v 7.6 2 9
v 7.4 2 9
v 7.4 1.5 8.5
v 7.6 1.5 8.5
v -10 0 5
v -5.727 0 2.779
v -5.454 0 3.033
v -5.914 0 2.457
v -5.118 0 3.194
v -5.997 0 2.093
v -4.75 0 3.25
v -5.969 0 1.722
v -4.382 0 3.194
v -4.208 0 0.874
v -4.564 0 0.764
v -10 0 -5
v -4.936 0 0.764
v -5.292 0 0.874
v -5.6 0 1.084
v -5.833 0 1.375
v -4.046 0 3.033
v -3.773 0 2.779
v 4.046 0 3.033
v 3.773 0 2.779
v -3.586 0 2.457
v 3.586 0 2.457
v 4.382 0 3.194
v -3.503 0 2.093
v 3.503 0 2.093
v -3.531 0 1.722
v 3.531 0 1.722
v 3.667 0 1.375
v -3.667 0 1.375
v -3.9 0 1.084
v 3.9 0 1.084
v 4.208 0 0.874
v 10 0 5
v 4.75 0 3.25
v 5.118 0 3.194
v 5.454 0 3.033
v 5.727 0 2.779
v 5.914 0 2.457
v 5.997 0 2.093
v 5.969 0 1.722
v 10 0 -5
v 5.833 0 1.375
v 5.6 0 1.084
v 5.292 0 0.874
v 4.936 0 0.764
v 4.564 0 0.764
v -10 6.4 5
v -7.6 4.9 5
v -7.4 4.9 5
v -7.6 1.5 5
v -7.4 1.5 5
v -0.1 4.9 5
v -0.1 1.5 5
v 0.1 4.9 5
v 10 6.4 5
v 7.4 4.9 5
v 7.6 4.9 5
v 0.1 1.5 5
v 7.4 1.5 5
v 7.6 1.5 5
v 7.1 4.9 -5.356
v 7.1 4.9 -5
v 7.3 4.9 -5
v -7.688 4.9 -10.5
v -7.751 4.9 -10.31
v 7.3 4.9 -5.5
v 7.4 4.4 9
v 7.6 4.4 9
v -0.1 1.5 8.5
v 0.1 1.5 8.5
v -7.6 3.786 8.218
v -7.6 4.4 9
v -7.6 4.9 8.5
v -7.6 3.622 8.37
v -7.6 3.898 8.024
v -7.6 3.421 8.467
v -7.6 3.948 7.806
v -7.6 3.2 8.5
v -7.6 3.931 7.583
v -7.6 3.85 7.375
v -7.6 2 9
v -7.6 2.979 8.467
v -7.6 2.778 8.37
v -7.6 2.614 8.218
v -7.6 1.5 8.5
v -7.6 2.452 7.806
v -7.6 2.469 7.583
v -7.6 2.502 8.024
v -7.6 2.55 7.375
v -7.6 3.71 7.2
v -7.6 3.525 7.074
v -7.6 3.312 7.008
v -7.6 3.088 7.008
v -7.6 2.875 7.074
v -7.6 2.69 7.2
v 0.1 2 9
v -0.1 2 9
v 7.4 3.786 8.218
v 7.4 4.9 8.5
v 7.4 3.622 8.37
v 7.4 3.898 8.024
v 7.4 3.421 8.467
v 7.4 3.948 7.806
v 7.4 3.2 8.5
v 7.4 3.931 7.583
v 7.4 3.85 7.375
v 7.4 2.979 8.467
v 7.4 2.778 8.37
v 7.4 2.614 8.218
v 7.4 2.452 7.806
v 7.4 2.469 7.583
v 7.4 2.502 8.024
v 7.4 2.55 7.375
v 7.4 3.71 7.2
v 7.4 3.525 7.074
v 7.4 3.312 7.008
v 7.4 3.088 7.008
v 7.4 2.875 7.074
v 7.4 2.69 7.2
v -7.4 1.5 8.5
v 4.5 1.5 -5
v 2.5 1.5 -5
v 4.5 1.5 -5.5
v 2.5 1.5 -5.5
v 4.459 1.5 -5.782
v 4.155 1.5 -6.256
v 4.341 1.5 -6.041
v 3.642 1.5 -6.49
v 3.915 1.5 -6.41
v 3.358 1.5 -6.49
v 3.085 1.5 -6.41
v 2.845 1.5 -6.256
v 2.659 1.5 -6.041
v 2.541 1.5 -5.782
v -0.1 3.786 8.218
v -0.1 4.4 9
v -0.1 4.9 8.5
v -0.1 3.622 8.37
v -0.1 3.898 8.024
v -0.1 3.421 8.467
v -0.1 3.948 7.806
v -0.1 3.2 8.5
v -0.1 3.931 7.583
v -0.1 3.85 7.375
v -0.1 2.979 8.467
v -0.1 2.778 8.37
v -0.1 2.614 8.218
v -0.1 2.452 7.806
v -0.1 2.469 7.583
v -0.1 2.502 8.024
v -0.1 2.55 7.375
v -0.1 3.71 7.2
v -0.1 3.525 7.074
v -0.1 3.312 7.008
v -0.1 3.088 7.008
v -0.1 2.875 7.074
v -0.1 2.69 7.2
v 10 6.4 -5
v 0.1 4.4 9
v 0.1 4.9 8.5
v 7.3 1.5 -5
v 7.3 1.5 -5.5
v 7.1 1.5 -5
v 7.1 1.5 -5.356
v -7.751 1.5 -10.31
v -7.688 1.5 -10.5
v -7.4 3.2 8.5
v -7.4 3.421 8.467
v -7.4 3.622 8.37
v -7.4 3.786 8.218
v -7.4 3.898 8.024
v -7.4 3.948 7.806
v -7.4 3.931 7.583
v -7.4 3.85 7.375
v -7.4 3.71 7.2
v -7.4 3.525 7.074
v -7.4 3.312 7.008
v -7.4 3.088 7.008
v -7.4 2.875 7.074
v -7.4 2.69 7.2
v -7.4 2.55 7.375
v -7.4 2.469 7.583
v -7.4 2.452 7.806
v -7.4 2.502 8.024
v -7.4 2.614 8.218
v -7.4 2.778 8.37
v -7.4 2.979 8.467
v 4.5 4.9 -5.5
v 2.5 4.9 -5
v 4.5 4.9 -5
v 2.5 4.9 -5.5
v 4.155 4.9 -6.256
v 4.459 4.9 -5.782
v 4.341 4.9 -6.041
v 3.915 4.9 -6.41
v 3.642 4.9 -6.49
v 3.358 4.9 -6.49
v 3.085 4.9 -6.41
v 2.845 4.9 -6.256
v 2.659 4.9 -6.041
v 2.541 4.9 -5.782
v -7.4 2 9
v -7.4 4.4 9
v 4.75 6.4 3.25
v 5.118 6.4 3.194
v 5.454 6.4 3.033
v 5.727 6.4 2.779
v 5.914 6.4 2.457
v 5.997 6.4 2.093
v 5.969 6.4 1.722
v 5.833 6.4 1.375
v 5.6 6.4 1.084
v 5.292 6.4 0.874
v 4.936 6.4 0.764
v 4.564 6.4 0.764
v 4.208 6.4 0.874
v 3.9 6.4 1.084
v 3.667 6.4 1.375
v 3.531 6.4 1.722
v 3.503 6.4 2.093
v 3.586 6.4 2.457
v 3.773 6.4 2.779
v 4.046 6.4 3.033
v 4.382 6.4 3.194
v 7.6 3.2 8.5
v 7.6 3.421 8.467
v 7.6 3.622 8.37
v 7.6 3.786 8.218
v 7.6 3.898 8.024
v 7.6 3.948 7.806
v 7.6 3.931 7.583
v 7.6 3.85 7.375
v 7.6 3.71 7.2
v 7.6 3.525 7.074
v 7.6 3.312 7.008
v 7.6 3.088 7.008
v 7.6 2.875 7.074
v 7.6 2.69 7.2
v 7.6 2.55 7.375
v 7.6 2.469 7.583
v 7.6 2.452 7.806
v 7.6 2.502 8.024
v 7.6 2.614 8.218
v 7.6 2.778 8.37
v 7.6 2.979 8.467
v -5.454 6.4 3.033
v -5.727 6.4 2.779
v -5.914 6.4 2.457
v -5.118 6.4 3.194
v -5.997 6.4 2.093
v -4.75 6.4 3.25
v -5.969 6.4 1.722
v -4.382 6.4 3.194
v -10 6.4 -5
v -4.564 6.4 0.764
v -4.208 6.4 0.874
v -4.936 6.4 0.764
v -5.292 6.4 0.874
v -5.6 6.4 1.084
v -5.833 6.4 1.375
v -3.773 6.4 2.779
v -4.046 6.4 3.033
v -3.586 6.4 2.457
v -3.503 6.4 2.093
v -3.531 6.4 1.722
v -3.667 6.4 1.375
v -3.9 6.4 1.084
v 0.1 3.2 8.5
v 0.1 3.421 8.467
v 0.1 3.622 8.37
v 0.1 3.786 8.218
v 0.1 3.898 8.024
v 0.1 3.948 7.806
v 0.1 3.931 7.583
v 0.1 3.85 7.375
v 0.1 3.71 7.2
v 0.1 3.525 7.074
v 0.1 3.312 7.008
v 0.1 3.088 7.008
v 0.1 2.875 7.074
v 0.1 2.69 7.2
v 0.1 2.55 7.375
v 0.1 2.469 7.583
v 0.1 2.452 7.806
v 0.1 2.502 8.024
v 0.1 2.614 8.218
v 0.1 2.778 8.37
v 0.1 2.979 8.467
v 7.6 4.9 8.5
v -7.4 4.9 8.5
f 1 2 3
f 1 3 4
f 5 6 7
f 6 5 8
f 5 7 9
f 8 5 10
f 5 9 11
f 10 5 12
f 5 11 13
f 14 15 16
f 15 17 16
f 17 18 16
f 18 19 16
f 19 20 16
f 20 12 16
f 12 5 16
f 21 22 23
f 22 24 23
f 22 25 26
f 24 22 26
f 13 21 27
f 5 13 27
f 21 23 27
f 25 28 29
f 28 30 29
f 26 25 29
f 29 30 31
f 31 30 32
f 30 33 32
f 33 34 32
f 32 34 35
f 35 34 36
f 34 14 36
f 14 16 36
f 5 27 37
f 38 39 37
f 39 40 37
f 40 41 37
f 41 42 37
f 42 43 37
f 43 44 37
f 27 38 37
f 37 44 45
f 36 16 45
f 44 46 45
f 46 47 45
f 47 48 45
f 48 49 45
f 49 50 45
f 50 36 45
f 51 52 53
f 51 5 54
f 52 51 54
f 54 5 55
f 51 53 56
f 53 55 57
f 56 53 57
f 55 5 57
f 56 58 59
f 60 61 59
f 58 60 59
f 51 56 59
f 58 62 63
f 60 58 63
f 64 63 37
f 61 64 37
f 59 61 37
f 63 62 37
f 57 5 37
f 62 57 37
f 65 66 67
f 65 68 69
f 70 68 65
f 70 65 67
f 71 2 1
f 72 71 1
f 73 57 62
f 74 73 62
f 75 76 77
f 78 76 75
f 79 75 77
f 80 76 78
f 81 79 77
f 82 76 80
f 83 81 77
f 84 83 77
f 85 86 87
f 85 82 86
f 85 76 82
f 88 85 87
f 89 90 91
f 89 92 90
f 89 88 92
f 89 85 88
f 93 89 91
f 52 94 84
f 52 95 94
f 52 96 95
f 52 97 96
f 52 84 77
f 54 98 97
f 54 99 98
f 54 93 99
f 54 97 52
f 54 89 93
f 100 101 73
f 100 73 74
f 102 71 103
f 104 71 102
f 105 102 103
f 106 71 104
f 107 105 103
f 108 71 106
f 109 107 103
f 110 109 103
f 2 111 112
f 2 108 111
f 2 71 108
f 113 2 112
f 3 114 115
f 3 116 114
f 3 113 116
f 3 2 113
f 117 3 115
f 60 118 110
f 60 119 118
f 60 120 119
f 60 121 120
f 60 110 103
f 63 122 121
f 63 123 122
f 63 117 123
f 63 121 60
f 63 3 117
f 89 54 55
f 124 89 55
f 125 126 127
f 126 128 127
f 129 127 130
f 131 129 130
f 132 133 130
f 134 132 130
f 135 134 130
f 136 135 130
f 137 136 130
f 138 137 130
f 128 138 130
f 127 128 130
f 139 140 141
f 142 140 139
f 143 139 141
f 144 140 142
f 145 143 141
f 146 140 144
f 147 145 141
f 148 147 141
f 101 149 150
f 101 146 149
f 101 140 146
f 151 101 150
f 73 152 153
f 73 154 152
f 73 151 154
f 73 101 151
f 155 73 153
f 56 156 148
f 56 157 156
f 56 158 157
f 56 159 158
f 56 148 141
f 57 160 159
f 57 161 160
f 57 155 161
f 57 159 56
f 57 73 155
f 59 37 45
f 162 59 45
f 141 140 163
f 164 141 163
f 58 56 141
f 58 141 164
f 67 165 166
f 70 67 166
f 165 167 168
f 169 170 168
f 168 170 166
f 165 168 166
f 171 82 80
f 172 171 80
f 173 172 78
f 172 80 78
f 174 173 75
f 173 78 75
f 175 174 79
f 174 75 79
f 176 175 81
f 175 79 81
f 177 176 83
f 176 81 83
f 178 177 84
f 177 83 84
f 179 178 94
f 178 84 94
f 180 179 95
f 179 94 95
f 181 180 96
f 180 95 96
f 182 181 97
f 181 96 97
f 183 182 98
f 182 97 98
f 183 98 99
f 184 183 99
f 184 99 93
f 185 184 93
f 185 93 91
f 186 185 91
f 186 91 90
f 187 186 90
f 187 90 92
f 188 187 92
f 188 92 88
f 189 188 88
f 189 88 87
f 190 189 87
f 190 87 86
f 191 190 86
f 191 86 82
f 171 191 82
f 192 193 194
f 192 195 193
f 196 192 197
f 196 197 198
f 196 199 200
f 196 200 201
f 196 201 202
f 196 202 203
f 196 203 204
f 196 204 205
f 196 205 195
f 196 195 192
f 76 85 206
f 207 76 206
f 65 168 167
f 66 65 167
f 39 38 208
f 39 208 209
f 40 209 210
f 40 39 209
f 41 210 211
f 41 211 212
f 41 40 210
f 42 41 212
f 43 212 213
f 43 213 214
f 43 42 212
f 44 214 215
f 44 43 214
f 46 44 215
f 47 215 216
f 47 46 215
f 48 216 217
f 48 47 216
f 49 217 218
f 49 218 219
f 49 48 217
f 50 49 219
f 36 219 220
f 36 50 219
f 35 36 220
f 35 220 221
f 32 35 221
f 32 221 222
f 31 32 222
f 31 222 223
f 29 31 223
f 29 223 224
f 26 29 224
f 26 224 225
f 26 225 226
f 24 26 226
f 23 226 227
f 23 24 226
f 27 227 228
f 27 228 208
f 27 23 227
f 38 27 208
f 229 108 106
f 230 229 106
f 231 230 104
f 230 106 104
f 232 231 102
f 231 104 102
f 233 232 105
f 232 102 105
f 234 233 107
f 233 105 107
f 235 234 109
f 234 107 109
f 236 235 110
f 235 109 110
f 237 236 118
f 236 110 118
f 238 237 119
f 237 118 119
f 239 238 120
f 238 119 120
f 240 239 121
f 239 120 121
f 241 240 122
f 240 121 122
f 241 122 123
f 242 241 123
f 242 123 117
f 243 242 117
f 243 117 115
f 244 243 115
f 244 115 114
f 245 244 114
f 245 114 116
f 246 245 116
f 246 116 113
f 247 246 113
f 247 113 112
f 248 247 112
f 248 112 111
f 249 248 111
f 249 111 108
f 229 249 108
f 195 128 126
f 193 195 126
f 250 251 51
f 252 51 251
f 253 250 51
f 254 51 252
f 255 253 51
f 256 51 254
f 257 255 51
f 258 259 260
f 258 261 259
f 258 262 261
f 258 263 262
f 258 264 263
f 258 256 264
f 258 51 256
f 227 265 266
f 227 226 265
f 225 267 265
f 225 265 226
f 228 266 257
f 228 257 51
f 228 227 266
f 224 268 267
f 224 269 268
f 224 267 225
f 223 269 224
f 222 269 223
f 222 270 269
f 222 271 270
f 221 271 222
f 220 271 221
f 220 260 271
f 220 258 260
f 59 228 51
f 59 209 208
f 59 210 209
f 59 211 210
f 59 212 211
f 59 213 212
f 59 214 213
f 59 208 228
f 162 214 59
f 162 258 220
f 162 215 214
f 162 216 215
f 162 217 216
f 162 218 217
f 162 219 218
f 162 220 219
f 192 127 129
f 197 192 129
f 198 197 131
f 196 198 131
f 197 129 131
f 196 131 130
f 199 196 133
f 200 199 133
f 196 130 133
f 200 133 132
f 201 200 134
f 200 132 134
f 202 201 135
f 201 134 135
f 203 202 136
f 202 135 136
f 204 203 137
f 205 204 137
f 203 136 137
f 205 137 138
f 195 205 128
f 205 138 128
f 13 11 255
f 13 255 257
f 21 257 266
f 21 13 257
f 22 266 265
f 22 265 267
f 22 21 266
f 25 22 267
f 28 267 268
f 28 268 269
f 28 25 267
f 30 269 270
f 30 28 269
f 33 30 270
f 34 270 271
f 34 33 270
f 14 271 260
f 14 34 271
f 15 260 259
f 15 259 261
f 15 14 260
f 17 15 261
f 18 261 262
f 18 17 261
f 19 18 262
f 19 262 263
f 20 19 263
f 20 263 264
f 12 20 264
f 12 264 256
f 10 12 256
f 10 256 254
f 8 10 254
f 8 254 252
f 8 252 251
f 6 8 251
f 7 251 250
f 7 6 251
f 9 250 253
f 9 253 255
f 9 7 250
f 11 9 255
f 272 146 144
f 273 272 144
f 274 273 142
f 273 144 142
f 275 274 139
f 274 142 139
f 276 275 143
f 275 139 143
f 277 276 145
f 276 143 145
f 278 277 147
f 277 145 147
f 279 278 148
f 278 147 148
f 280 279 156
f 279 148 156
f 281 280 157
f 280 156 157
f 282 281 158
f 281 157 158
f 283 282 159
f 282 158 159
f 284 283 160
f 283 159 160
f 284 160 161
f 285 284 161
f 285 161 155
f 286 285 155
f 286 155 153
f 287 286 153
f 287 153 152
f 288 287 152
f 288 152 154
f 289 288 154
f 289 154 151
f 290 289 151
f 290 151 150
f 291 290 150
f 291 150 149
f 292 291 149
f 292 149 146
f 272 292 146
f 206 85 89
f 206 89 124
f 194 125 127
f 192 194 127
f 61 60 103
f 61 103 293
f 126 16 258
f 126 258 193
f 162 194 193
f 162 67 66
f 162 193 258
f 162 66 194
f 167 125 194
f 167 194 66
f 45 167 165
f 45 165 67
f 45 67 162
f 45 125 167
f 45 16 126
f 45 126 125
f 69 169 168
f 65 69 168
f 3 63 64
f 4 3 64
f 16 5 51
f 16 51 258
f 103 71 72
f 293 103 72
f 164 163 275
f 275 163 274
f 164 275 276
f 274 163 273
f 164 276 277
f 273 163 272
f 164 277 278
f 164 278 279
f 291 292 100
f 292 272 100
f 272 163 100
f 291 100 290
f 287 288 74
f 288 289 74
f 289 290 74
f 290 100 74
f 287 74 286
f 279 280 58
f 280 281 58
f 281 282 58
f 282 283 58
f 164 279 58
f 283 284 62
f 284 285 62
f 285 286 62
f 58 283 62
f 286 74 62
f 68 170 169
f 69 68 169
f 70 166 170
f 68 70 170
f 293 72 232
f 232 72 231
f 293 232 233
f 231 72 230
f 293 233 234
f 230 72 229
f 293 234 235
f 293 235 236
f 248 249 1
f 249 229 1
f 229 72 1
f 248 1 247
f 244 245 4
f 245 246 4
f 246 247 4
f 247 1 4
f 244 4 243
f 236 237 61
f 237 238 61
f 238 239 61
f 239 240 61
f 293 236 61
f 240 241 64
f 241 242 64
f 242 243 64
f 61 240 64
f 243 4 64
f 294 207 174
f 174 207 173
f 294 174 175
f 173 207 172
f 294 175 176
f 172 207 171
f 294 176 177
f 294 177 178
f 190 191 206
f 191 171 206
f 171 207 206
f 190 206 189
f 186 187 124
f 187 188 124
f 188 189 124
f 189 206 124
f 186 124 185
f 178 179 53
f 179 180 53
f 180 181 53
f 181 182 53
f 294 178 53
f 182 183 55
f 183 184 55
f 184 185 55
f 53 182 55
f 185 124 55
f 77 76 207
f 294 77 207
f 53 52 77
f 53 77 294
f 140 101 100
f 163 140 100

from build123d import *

# Parameters (mm, degrees)
SKETCH1_R           = 1.25
BOSS_EXTRUDE1_DEPTH = 6.4
BOSS_EXTRUDE2_START = 1.5
SKETCH1_3_W         = 0.2
SKETCH1_3_H         = 4
BOSS_EXTRUDE2_DEPTH = 3.4
CHAMFER2_SIZE       = 0.5
SKETCH3_R           = 0.75
CUT_EXTRUDE2_DEPTH  = 20.4


with BuildPart() as part:
    # Sketch1 → Boss-Extrude1 (new body)
    with BuildSketch(Plane(origin=(0, 0, 0), x_dir=(1, 0, 0), z_dir=(0, 1, 0))):
        Polygon((10, 5), (7.3, 5), (7.1, 5), (4.5, 5), (2.5, 5), (-10, 5), (-10, -5), (-7.6, -5), (-7.4, -5), (-0.1, -5), (0.1, -5), (7.4, -5), (7.6, -5), (10, -5), align=None)
        with Locations((-4.75, -2)):
            Circle(SKETCH1_R, mode=Mode.SUBTRACT)
        with Locations((4.75, -2)):
            Circle(SKETCH1_R, mode=Mode.SUBTRACT)
    extrude(amount=BOSS_EXTRUDE1_DEPTH)

    # Sketch1<3> → Boss-Extrude2 (add)
    with BuildSketch(Plane(origin=(0, 0, 0), x_dir=(1, 0, 0), z_dir=(0, 1, 0)).offset(BOSS_EXTRUDE2_START)):
        Polygon((7.1, 5), (7.3, 5), (7.3, 5.5), (-7.687995196, 10.5), (-7.751286335, 10.310278542), (7.1, 5.355884662), align=None)
        with BuildLine():
            Line((2.5, 5), (4.5, 5))
            Line((4.5, 5), (4.5, 5.5))
            ThreePointArc((4.5, 5.5), (3.5, 6.5), (2.5, 5.5))
            Line((2.5, 5.5), (2.5, 5))
        make_face()
        with Locations((7.5, -7)):
            Rectangle(SKETCH1_3_W, SKETCH1_3_H)
        with Locations((0, -7)):
            Rectangle(SKETCH1_3_W, SKETCH1_3_H)
        with Locations((-7.5, -7)):
            Rectangle(SKETCH1_3_W, SKETCH1_3_H)
    extrude(amount=BOSS_EXTRUDE2_DEPTH)

    # Chamfer2
    chamfer2_edges = [part.edges().sort_by_distance(p)[0] for p in [
        (7.5, 1.5, 9),
        (7.5, 4.9, 9),
        (0, 1.5, 9),
        (0, 4.9, 9),
        (-7.5, 1.5, 9),
        (-7.5, 4.9, 9),
    ]]
    chamfer(chamfer2_edges, length=CHAMFER2_SIZE)

    # Sketch3 → Cut-Extrude2 (cut)
    with BuildSketch(Plane.ZY.offset(7.6)):
        with Locations((7.75, 3.2)):
            Circle(SKETCH3_R)
    extrude(amount=-CUT_EXTRUDE2_DEPTH, mode=Mode.SUBTRACT)


solid = part.part
